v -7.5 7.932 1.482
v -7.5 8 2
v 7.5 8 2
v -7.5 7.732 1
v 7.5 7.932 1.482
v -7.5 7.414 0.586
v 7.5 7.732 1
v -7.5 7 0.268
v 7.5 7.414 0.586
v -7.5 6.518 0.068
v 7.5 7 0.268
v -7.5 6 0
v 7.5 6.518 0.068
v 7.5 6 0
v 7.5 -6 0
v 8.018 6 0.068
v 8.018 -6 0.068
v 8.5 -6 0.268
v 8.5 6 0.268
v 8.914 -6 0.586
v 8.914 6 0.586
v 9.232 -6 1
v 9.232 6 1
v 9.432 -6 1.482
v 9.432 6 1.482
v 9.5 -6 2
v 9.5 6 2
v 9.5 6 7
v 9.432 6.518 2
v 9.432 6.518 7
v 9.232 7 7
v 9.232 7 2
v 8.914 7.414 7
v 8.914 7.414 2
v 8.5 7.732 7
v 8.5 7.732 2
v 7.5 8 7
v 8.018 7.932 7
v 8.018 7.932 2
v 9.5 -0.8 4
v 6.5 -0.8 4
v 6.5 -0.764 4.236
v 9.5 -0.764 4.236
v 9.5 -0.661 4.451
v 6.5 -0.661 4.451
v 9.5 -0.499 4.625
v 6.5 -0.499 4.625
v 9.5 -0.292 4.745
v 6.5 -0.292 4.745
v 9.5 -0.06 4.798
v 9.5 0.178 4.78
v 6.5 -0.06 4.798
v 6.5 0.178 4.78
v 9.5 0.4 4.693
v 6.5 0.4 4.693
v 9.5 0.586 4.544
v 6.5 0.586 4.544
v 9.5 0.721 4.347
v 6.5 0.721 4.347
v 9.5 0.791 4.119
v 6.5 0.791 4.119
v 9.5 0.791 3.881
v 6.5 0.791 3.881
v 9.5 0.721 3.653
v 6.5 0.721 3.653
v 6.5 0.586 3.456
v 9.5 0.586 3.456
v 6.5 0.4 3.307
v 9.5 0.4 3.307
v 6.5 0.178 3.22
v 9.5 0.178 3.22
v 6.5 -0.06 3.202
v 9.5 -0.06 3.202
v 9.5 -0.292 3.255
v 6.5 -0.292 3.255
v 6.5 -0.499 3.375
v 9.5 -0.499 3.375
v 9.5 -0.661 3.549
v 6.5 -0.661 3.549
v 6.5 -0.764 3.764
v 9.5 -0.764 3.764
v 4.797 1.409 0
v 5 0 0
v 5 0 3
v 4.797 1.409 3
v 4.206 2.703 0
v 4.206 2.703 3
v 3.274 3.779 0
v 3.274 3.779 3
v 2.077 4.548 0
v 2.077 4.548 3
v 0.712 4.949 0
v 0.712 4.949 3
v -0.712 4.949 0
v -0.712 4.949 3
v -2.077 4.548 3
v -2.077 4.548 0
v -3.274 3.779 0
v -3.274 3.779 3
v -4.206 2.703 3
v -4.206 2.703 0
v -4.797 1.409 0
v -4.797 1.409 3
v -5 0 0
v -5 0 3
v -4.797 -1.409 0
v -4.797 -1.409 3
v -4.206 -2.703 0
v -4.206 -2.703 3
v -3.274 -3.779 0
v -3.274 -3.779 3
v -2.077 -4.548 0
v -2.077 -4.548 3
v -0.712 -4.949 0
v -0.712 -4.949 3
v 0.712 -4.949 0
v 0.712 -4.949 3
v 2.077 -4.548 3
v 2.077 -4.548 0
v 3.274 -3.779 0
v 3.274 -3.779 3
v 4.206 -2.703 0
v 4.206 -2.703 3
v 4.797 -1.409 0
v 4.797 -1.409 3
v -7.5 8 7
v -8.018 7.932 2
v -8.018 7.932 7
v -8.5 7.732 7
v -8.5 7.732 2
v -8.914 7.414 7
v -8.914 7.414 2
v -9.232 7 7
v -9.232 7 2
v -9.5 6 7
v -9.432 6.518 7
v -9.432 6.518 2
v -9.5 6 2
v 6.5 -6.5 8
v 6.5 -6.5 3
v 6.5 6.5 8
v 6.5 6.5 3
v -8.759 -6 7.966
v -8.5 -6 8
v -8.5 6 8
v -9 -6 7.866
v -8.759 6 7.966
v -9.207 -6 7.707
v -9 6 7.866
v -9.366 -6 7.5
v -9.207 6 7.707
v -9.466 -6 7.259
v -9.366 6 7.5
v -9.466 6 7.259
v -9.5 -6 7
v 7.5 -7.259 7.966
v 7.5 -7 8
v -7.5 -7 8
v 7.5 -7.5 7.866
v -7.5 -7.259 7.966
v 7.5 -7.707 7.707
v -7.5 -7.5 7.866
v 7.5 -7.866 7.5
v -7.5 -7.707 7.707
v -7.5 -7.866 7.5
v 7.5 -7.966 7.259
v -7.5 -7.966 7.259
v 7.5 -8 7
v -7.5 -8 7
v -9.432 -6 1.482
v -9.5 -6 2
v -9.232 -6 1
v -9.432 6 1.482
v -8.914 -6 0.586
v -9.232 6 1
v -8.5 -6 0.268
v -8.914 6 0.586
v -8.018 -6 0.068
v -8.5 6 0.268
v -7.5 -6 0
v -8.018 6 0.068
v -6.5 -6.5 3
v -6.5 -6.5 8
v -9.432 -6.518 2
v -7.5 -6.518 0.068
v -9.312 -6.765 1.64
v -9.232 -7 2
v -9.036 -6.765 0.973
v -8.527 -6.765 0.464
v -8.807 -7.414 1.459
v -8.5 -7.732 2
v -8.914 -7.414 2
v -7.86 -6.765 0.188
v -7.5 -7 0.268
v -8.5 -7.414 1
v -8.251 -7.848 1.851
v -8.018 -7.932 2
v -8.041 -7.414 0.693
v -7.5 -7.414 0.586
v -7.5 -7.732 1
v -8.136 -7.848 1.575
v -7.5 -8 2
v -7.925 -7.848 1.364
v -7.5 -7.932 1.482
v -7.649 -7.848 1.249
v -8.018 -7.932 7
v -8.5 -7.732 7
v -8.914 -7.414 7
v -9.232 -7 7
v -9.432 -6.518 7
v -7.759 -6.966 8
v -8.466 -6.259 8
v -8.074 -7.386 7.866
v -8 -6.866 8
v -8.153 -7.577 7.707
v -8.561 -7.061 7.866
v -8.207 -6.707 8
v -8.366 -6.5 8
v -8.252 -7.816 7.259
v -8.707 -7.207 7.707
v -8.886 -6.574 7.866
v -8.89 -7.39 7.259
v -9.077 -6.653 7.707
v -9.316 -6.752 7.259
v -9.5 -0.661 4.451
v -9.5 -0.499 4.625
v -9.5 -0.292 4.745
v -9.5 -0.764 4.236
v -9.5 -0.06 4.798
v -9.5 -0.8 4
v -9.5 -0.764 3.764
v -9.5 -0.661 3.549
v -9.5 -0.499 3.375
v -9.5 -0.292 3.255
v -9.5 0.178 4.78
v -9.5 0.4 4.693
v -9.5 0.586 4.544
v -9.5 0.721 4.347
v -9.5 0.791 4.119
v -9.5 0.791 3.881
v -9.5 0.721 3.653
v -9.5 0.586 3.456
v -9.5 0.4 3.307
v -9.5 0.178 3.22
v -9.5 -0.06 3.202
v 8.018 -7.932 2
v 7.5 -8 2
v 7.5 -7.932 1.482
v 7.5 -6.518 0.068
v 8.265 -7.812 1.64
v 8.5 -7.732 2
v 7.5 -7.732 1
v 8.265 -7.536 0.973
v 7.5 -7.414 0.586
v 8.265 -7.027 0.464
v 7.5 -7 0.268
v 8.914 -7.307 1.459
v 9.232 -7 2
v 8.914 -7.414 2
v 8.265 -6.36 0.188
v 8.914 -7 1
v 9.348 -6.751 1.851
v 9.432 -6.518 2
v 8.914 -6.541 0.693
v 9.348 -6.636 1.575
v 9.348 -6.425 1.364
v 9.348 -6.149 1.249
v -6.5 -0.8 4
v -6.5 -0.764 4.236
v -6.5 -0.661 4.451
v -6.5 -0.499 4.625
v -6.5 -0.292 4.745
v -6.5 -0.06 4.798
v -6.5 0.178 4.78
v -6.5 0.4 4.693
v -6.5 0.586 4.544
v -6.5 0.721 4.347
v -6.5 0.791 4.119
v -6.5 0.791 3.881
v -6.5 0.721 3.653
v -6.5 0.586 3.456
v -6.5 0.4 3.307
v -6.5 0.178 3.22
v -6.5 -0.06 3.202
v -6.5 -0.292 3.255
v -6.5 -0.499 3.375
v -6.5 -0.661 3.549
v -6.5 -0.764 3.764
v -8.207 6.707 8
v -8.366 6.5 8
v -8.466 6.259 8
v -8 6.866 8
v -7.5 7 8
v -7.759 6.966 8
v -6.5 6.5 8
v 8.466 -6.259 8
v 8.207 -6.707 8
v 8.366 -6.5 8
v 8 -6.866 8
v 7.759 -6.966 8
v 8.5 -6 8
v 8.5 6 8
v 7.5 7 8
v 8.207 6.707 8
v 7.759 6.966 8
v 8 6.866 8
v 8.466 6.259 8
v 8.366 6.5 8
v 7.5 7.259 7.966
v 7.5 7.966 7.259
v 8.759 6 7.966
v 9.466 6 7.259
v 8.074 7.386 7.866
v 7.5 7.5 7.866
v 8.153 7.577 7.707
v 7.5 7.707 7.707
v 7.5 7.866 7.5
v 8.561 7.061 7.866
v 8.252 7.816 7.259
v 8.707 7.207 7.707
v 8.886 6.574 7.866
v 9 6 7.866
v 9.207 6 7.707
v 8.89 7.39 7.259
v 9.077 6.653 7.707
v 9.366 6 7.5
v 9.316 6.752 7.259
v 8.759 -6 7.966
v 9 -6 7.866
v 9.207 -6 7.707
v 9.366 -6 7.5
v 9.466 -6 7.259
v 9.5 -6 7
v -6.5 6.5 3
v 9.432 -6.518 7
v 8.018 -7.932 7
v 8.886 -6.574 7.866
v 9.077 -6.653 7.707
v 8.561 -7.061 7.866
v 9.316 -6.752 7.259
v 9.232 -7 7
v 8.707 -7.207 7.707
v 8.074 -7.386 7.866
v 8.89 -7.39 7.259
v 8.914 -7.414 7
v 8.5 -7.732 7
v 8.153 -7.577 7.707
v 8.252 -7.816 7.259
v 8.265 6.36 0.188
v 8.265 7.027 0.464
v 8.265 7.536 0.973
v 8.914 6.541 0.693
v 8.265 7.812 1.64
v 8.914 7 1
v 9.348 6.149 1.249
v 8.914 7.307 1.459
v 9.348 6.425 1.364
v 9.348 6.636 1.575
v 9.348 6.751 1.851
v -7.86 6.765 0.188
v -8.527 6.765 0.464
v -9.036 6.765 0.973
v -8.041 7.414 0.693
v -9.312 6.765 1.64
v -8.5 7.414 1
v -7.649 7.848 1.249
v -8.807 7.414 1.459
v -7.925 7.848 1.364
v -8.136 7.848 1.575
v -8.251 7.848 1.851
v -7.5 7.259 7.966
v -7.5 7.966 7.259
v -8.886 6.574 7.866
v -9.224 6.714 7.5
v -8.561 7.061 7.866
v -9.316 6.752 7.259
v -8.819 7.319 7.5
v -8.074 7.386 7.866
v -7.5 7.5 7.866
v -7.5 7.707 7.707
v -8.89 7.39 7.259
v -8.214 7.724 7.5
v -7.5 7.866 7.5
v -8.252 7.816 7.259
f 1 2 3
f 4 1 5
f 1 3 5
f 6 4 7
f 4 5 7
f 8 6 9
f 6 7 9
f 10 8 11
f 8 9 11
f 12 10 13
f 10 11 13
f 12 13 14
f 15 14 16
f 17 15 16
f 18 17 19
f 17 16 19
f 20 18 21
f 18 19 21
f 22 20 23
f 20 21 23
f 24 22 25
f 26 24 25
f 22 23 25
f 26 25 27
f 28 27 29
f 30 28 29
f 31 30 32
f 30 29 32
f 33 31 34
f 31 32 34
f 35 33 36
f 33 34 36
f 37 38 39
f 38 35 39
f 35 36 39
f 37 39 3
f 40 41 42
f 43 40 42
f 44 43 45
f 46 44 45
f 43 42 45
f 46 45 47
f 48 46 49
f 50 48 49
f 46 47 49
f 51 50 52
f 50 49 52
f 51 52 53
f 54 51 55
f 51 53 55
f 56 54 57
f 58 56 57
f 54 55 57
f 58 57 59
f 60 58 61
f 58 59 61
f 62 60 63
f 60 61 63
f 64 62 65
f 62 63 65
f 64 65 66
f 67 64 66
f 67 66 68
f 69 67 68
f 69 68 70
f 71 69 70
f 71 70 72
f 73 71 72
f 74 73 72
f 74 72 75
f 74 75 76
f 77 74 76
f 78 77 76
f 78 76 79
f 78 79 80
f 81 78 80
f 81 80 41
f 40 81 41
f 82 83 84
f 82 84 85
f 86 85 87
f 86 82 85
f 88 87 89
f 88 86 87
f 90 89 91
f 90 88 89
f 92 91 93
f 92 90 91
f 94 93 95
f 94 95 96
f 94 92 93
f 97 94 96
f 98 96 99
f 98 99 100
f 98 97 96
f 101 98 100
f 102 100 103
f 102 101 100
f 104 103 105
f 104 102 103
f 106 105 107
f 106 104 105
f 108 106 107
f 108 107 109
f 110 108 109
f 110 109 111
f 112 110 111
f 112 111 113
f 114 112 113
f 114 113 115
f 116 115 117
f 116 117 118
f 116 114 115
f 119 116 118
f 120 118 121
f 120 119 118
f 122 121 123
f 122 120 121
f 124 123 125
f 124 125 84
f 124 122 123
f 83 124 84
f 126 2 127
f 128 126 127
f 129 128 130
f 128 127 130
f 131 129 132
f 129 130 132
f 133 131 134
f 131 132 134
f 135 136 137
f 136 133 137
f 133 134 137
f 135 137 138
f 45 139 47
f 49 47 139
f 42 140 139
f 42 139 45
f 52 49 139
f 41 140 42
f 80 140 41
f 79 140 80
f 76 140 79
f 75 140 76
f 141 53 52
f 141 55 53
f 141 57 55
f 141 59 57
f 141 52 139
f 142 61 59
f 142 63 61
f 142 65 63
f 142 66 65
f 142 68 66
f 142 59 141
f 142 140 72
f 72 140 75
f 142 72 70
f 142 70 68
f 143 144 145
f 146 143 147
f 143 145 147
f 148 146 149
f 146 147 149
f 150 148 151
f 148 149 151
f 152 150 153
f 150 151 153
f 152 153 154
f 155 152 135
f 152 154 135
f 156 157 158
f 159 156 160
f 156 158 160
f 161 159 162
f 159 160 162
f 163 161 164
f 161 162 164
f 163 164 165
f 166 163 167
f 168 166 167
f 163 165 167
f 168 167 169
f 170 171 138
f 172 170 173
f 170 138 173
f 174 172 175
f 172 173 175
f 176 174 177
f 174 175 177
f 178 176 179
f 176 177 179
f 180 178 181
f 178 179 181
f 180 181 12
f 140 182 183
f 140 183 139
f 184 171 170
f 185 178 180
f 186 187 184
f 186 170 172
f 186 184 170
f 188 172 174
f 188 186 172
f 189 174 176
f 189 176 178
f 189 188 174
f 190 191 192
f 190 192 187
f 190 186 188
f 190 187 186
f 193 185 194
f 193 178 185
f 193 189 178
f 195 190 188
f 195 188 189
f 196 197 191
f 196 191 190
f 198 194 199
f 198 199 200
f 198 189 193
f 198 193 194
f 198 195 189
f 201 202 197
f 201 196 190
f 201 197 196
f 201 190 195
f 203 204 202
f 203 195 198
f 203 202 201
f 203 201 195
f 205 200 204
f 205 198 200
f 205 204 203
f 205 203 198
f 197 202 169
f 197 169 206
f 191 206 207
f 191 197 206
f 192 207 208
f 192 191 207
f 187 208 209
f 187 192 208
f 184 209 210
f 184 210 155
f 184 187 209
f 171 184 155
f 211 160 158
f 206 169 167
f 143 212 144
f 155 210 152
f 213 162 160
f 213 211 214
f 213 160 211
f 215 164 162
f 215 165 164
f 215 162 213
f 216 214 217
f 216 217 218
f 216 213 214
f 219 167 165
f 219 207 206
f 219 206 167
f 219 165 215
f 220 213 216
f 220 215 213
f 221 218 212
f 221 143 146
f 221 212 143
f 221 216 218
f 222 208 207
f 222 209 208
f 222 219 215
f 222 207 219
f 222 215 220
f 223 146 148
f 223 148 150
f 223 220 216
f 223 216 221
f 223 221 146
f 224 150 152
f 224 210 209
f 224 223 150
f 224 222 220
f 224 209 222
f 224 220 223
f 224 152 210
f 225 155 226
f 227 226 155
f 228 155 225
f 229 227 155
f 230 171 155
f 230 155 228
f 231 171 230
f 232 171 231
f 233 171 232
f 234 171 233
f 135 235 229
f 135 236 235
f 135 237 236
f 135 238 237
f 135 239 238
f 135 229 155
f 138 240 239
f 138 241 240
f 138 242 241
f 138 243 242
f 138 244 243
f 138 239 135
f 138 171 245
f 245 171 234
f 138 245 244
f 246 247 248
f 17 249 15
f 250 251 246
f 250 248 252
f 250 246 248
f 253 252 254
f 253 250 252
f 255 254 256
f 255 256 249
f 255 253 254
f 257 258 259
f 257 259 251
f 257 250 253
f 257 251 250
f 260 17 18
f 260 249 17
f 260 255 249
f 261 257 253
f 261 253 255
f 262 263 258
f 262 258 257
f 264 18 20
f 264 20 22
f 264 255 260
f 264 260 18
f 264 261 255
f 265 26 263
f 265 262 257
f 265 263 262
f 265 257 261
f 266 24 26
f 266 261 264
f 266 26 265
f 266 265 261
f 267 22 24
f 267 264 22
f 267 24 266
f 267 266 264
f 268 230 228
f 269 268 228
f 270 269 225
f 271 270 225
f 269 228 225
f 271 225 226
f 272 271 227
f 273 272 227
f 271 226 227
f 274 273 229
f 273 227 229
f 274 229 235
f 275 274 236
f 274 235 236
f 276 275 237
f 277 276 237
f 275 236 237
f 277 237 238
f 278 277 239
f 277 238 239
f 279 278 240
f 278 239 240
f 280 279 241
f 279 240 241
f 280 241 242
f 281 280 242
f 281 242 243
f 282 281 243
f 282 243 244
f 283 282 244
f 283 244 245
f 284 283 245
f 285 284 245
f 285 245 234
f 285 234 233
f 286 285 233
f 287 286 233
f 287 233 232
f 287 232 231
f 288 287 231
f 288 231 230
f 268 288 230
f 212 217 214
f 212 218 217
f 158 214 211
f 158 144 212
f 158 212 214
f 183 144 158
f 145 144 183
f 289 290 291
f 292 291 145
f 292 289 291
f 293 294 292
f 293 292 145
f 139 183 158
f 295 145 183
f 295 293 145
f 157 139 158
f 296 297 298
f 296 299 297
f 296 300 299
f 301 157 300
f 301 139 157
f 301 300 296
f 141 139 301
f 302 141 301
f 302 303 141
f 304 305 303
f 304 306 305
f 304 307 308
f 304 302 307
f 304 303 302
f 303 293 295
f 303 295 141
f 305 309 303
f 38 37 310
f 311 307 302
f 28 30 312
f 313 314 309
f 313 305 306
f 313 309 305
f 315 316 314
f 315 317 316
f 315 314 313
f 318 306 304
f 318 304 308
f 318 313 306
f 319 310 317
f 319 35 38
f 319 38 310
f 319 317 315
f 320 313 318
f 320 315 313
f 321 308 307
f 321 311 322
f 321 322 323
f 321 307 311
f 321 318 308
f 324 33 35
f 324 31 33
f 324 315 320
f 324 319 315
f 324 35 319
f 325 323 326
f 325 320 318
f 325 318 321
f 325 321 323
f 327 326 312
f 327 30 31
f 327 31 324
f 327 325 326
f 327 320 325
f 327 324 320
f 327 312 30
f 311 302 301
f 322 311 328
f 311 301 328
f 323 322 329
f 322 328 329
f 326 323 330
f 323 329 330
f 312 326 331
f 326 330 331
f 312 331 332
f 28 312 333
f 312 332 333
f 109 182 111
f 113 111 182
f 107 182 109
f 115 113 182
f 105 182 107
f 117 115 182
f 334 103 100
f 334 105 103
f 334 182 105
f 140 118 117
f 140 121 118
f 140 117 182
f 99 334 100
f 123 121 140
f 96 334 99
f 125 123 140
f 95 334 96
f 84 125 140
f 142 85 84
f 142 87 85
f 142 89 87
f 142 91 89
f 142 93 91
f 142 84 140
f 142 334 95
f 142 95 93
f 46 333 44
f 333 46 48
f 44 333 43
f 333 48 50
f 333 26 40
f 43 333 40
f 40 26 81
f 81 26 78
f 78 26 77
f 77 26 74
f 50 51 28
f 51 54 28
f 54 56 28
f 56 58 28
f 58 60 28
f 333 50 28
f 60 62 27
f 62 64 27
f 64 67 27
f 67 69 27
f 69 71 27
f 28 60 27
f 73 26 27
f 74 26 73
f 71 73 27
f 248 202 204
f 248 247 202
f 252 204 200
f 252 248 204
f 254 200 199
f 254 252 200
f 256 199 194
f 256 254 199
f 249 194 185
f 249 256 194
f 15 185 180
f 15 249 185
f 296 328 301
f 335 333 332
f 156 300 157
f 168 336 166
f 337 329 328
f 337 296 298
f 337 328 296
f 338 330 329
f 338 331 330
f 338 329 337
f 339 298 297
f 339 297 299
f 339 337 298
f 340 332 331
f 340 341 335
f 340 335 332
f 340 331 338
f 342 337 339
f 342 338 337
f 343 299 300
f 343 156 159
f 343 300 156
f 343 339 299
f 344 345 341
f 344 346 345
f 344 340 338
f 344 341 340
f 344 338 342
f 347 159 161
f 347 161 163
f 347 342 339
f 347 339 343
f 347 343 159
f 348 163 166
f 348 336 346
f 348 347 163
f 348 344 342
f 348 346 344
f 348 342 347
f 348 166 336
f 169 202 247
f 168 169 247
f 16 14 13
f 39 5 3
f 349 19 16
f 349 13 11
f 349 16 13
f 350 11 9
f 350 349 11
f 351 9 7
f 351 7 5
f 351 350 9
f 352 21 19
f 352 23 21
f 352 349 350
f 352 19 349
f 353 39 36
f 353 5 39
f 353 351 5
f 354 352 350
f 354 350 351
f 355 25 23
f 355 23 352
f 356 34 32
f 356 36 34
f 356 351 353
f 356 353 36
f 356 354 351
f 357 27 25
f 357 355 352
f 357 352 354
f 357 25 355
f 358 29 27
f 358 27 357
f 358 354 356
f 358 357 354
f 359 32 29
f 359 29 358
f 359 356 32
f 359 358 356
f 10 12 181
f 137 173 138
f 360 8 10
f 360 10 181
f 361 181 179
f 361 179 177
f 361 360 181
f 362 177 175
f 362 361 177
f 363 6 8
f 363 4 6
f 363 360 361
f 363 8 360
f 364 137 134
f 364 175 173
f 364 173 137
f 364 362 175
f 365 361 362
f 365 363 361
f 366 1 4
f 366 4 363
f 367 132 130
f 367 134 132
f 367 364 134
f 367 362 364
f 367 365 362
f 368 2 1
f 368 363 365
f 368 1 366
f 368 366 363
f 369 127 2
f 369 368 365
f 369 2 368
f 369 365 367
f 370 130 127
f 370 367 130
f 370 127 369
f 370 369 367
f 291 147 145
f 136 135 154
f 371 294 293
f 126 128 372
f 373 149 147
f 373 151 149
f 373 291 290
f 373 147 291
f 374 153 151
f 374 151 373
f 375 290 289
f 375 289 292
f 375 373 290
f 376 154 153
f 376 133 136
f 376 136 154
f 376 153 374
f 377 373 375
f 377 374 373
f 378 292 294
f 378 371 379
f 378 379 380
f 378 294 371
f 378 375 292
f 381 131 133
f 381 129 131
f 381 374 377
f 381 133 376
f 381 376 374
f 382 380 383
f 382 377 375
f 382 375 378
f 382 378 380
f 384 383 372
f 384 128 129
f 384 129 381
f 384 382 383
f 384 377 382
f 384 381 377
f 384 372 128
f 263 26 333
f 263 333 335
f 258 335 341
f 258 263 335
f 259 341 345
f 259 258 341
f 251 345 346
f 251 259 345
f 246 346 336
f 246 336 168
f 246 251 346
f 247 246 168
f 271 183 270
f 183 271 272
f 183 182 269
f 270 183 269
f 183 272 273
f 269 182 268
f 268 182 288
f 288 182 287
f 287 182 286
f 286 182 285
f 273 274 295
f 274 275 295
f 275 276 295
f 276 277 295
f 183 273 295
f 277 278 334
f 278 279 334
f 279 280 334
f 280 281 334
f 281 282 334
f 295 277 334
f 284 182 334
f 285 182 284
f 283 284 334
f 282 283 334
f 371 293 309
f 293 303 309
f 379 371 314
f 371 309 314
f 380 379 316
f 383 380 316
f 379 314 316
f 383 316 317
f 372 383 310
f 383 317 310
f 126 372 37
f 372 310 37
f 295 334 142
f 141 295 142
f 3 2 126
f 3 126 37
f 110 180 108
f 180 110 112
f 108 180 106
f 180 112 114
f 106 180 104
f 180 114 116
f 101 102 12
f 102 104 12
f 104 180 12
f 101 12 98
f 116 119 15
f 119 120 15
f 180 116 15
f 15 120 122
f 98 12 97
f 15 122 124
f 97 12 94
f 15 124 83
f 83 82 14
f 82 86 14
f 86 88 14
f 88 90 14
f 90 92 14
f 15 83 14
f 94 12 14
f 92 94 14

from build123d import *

# Parameters (mm, degrees)
F0_W         = 19
F0_H         = 16
F0_W_2       = 13
F0_H_2       = 13
F0_R         = 5
F1_DEPTH     = 3
F2_W         = 19
F2_H         = 16
F2_W_2       = 13
F2_H_2       = 13
F3_DEPTH     = 5
F5_D         = 1.6
F6_R         = 2
F7_T1_DEPTH  = 11
F7_S5_W      = 2
F7_S5_H      = 2
F7_T6_DEPTH  = 2
F7_S11_W     = 2
F7_S11_H     = 2
F7_T12_DEPTH = 2
F7_S17_W     = 2
F7_S17_H     = 2
F7_T18_DEPTH = 2
F7_S23_W     = 2
F7_S23_H     = 2
F7_T24_DEPTH = 2
F8_R         = 1


# Not quite as in the source:
# - a fillet or chamfer that OpenCascade refuses, or shapes differently, is made with other operations: its cross-section is extruded or revolved along the edge and cut away or added


with BuildPart() as f1:
    # F0 (on Top) → F1 (new body)
    with BuildSketch(Plane.XY):
        Rectangle(F0_W, F0_H)
        Rectangle(F0_W_2, F0_H_2, mode=Mode.SUBTRACT)
        Rectangle(F0_W_2, F0_H_2)
        Circle(F0_R, mode=Mode.SUBTRACT)
    extrude(amount=F1_DEPTH)

    # F2 (on face) → F3 (join)
    with BuildSketch(Plane.XY.offset(3)):
        Rectangle(F2_W, F2_H)
        Rectangle(F2_W_2, F2_H_2, mode=Mode.SUBTRACT)
    extrude(amount=F3_DEPTH)

    # F5 (through all)
    with Locations(Plane.YZ.offset(9.5)):
        with Locations((0, 4)):
            Hole(F5_D / 2)

    # F6
    f6_edges = [f1.edges().sort_by_distance(p)[0] for p in [
        (0, -8, 0),
        (0, 8, 0),
        (-9.5, 0, 0),
        (9.5, 0, 0),
    ]]
    fillet(f6_edges, radius=F6_R)

    # F7: fillet of radius 2 on 4 edges, made by hand

    # F7_s2 → F7_t1 (cut)
    with BuildSketch(Plane.XY.offset(2)):
        with BuildLine():
            ThreePointArc((9.5, -6), (8.9142135624, -7.4142135624), (7.5, -8))
            Line((7.5, -8), (9.5, -8))
            Line((9.5, -8), (9.5, -6))
        make_face()
        with BuildLine():
            ThreePointArc((9.5, 6), (8.9142135624, 7.4142135624), (7.5, 8))
            Line((7.5, 8), (9.5, 8))
            Line((9.5, 8), (9.5, 6))
        make_face()
        with BuildLine():
            ThreePointArc((-7.5, -8), (-8.9142135624, -7.4142135624), (-9.5, -6))
            Line((-9.5, -6), (-9.5, -8))
            Line((-9.5, -8), (-7.5, -8))
        make_face()
        with BuildLine():
            ThreePointArc((-7.5, 8), (-8.9142135624, 7.4142135624), (-9.5, 6))
            Line((-9.5, 6), (-9.5, 8))
            Line((-9.5, 8), (-7.5, 8))
        make_face()
    extrude(amount=F7_T1_DEPTH, mode=Mode.SUBTRACT)


with BuildPart() as f7_tool4:
    # F7_s5 → F7_t6 (new body)
    with BuildSketch(Plane.XZ.offset(-6)):
        with Locations((-8.5, 1)):
            Rectangle(F7_S5_W, F7_S5_H)
    extrude(amount=-F7_T6_DEPTH)

    # F7_s7 → F7_t8 (revolve, cut)
    with BuildSketch(Plane(origin=(-7.5, 6, 2), x_dir=(0.7071067812, 0, 0.7071067812), z_dir=(-0.7071067812, 0, 0.7071067812))):
        with BuildLine():
            ThreePointArc((0, -2), (2, 0), (0, 2))
            Line((0, 2), (0, -2))
        make_face()
    revolve(axis=Axis((-7.5, 6, 2), (0, 1, 0)), mode=Mode.SUBTRACT)


with BuildPart() as f1_1:
    add(f1.part)

    # F7_t3: cut F7_tool4
    add(f7_tool4.part, mode=Mode.SUBTRACT)


with BuildPart() as f7_tool10:
    # F7_s11 → F7_t12 (new body)
    with BuildSketch(Plane.XZ.offset(6)):
        with Locations((-8.5, 1)):
            Rectangle(F7_S11_W, F7_S11_H)
    extrude(amount=F7_T12_DEPTH)

    # F7_s13 → F7_t14 (revolve, cut)
    with BuildSketch(Plane(origin=(-7.5, -6, 2), x_dir=(0.7071067812, 0, 0.7071067812), z_dir=(0.7071067812, 0, -0.7071067812))):
        with BuildLine():
            ThreePointArc((0, -2), (2, 0), (0, 2))
            Line((0, 2), (0, -2))
        make_face()
    revolve(axis=Axis((-7.5, -6, 2), (0, -1, 0)), mode=Mode.SUBTRACT)


with BuildPart() as f1_2:
    add(f1_1.part)

    # F7_t9: cut F7_tool10
    add(f7_tool10.part, mode=Mode.SUBTRACT)


with BuildPart() as f7_tool16:
    # F7_s17 → F7_t18 (new body)
    with BuildSketch(Plane.YZ.offset(7.5)):
        with Locations((7, 1)):
            Rectangle(F7_S17_W, F7_S17_H)
    extrude(amount=F7_T18_DEPTH)

    # F7_s19 → F7_t20 (revolve, cut)
    with BuildSketch(Plane(origin=(7.5, 6, 2), x_dir=(0, -0.7071067812, 0.7071067812), z_dir=(0, 0.7071067812, 0.7071067812))):
        with BuildLine():
            ThreePointArc((0, -2), (2, 0), (0, 2))
            Line((0, 2), (0, -2))
        make_face()
    revolve(axis=Axis((7.5, 6, 2), (1, 0, 0)), mode=Mode.SUBTRACT)


with BuildPart() as f1_3:
    add(f1_2.part)

    # F7_t15: cut F7_tool16
    add(f7_tool16.part, mode=Mode.SUBTRACT)


with BuildPart() as f7_tool22:
    # F7_s23 → F7_t24 (new body)
    with BuildSketch(Plane.YZ.offset(7.5)):
        with Locations((-7, 1)):
            Rectangle(F7_S23_W, F7_S23_H)
    extrude(amount=F7_T24_DEPTH)

    # F7_s25 → F7_t26 (revolve, cut)
    with BuildSketch(Plane(origin=(7.5, -6, 2), x_dir=(0, 0.7071067812, 0.7071067812), z_dir=(0, 0.7071067812, -0.7071067812))):
        with BuildLine():
            ThreePointArc((0, -2), (2, 0), (0, 2))
            Line((0, 2), (0, -2))
        make_face()
    revolve(axis=Axis((7.5, -6, 2), (1, 0, 0)), mode=Mode.SUBTRACT)


with BuildPart() as f1_4:
    add(f1_3.part)

    # F7_t21: cut F7_tool22
    add(f7_tool22.part, mode=Mode.SUBTRACT)

    # F8
    f8_edges = [f1_4.edges().sort_by_distance(p)[0] for p in [
        (0, 8, 8),
    ]]
    fillet(f8_edges, radius=F8_R)


solid = f1_4.part
